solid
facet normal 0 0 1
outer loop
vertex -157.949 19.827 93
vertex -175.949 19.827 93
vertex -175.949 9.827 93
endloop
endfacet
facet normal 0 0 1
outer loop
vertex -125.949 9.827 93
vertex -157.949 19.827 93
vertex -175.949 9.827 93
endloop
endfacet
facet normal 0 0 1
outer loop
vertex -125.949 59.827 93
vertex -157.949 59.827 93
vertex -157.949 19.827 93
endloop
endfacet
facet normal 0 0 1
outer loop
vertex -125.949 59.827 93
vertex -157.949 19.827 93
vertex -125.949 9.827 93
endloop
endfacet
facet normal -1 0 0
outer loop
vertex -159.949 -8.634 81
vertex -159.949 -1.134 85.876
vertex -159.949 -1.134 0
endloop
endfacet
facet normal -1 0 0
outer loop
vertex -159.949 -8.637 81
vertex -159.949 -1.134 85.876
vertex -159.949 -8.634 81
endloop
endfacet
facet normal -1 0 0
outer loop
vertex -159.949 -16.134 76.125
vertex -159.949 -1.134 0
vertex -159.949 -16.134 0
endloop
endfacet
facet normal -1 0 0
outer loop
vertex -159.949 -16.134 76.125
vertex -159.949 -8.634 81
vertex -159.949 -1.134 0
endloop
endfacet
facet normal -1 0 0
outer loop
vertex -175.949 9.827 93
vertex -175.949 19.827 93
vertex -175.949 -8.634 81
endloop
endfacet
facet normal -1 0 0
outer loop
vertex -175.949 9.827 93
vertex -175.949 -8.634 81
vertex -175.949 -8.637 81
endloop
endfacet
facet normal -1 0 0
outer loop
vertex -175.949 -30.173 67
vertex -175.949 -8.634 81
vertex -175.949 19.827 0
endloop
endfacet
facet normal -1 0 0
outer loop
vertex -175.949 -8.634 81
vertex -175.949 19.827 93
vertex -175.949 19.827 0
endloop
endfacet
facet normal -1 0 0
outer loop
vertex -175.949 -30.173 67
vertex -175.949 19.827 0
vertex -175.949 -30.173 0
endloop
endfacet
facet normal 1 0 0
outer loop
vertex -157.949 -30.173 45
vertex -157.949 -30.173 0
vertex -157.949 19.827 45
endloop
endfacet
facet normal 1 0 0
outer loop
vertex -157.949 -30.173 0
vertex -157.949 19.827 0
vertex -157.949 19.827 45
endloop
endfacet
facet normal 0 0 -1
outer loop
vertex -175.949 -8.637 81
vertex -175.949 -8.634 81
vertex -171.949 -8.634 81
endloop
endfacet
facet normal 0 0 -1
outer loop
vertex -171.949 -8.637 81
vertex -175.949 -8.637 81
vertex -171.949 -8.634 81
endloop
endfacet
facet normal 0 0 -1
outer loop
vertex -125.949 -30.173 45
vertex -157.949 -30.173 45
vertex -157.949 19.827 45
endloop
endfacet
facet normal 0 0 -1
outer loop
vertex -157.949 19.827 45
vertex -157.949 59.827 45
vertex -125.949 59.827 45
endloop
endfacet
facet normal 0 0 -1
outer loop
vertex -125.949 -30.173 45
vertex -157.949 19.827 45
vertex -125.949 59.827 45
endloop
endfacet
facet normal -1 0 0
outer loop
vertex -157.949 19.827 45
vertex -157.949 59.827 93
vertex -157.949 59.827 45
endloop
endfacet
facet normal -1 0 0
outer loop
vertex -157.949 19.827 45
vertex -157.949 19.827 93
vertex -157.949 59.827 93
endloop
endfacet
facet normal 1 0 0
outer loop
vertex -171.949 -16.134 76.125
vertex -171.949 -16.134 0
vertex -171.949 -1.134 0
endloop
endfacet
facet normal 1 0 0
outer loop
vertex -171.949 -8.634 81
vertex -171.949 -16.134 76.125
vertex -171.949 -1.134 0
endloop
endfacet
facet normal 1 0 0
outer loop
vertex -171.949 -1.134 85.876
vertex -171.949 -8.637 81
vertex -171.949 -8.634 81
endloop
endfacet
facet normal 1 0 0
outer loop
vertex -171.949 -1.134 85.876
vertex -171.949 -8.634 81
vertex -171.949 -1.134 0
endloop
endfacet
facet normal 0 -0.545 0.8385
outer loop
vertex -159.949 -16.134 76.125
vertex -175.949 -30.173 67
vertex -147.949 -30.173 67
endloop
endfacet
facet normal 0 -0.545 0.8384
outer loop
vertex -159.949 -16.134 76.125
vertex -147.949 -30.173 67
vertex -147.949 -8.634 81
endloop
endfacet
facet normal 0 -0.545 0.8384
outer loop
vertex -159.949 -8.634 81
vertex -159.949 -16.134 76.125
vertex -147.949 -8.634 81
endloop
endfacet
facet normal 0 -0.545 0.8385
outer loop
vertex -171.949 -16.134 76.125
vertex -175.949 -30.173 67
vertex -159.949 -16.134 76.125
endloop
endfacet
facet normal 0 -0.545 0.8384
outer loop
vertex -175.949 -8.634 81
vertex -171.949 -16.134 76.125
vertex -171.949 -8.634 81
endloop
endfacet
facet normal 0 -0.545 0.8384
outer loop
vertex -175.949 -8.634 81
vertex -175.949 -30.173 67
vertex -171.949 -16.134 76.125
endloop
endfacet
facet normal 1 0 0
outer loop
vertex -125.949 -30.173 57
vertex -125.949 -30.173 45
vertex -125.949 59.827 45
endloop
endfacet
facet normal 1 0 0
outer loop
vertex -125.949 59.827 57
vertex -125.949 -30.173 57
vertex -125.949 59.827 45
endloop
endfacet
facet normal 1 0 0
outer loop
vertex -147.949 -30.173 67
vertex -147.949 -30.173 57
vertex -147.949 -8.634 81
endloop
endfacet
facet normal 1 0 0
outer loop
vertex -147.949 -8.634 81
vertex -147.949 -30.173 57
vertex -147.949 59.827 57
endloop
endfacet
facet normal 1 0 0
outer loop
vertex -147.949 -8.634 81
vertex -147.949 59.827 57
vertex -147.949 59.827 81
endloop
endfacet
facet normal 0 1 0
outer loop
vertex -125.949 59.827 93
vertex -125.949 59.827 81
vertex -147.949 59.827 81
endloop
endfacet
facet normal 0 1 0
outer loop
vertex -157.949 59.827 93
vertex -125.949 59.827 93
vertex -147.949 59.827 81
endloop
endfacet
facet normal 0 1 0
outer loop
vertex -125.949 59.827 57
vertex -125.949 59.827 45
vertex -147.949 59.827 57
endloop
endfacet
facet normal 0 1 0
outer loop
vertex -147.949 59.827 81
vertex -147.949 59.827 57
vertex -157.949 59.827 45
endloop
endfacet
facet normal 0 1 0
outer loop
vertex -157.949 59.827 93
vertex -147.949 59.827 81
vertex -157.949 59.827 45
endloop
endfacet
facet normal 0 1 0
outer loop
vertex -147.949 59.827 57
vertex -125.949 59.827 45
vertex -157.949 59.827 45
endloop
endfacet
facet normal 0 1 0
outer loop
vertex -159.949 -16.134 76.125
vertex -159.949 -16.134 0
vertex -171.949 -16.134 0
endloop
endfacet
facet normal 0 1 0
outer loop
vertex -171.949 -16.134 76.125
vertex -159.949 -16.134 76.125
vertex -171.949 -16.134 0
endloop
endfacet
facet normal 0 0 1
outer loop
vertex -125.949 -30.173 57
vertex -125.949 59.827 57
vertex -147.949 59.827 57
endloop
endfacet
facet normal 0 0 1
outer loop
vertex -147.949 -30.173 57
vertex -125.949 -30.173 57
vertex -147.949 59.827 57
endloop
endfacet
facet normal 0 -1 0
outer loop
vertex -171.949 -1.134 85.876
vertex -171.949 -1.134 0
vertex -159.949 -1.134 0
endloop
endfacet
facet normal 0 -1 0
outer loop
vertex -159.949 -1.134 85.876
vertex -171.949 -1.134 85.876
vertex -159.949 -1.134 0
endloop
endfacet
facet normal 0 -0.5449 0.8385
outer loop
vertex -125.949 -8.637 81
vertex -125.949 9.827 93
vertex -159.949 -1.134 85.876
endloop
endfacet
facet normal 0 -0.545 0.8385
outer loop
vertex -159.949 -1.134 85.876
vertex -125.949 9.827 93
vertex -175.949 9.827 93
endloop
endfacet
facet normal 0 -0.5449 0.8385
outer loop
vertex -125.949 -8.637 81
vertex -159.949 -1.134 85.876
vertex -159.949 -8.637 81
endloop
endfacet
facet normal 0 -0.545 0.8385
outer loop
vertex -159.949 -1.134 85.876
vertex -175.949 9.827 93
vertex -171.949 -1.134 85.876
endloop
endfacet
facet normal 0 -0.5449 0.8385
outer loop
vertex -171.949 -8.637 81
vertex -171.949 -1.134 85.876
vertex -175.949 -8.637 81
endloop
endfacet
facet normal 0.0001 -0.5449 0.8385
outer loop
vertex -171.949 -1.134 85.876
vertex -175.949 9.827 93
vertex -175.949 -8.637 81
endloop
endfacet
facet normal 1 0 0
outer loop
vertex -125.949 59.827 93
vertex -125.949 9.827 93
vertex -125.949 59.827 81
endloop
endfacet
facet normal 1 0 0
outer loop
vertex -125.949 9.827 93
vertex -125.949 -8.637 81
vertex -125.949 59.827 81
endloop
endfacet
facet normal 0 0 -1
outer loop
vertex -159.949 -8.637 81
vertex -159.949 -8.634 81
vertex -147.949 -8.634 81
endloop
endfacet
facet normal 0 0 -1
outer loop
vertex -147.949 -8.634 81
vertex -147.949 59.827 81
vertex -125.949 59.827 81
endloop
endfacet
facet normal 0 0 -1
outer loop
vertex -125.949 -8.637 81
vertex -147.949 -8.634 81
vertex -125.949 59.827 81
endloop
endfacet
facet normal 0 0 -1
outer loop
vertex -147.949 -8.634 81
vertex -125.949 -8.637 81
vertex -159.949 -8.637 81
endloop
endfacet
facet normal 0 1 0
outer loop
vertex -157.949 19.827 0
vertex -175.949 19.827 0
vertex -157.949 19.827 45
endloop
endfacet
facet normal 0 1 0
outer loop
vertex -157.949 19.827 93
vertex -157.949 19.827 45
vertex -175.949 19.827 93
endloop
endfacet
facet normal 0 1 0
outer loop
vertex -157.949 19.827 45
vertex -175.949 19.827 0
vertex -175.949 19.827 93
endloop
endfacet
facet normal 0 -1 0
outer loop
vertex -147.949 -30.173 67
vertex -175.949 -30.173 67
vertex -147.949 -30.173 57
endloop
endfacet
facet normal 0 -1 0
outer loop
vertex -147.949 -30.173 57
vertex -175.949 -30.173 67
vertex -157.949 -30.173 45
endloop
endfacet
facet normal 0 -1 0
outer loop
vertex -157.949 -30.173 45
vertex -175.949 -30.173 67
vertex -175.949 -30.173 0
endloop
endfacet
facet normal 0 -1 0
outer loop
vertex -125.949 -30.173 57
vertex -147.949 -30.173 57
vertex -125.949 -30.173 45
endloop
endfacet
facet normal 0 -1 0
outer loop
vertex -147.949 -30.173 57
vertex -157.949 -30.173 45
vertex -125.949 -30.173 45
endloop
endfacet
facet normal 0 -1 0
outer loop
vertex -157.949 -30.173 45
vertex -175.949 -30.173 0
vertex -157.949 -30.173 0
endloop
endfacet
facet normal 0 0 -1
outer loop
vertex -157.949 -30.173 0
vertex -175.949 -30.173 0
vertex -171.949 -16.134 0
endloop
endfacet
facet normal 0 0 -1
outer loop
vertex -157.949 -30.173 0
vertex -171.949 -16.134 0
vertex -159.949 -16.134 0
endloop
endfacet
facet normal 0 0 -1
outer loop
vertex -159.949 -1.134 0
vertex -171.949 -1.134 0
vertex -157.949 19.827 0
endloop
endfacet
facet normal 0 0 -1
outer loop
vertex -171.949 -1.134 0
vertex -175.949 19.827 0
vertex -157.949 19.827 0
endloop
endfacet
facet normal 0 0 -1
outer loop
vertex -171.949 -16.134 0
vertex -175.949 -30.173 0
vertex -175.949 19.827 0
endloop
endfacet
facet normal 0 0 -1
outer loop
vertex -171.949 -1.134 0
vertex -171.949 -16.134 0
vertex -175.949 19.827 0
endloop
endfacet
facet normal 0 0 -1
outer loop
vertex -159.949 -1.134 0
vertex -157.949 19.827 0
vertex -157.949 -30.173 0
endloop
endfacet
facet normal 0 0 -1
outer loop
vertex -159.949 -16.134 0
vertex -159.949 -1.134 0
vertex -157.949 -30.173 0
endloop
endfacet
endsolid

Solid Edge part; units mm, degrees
sketch "Sketch1" plane through (0, 0, 0) normal (0, 0, 1) x (1, 0, 0)
  line L0 (-175.9492, -30.1726) -> (-125.9492, -30.1726)
  line L1 (-175.9492, 59.8274) -> (-175.9492, -30.1726)
  line L2 (-125.9492, 59.8274) -> (-175.9492, 59.8274)
  line L3 (-125.9492, -30.1726) -> (-125.9492, 59.8274)
extrude "Protrusion1" add sketch "Sketch1" along normal blind 93
sketch "Sketch2" plane through (-150.9492, -30.1726, 46.5) normal (0, -1, 0) x (1, 0, 0)
  line L0 (25, -46.5) -> (-7, -46.5)
  line L1 (-7, -46.5) -> (-7, -1.5)
  line L2 (-7, -1.5) -> (25, -1.5)
  line L3 (25, -1.5) -> (25, -46.5)
extrude "ExtrudedCutout_1" cut sketch "Sketch2" along normal mid plane 366
sketch "Sketch3" plane through (-157.9492, 14.8274, 22.5) normal (1, 0, 0) x (0, 1, 0)
  line L0 (45, -22.5) -> (5, -22.5)
  line L1 (5, -22.5) -> (5, 22.5)
  line L2 (5, 22.5) -> (45, 22.5)
  line L3 (45, 22.5) -> (45, -22.5)
extrude "ExtrudedCutout_2" cut sketch "Sketch3" along normal mid plane 188
sketch "Sketch4" plane through (-150.9492, -30.1726, 46.5) normal (0, -1, 0) x (1, 0, 0)
  line L0 (25, 10.5) -> (3, 10.5)
  line L1 (3, 10.5) -> (3, 34.5)
  line L2 (3, 34.5) -> (25, 34.5)
  line L3 (25, 34.5) -> (25, 10.5)
extrude "ExtrudedCutout_3" cut sketch "Sketch4" along normal mid plane 238
sketch "Sketch5" plane through (-147.9492, 14.8274, 69) normal (1, 0, 0) x (0, 1, 0)
  line L0 (-45, 12) -> (-23.4615, 12)
  line L1 (-45, -2) -> (-23.4615, 12)
  line L2 (-45, -2) -> (-45, 12)
extrude "ExtrudedCutout_4" cut sketch "Sketch5" along normal mid plane 92
sketch "Sketch6" plane through (-125.9492, 14.8274, 87) normal (1, 0, 0) x (0, 1, 0)
  line L0 (-5, 6) -> (-23.4643, -6)
  line L1 (-23.4643, -6) -> (-45, -6)
  line L2 (-45, -6) -> (-45, 6)
  line L3 (-45, 6) -> (-5, 6)
extrude "ExtrudedCutout_5" cut sketch "Sketch6" along normal mid plane 122
sketch "Sketch7" plane through (-175.9492, 14.8274, 46.5) normal (-1, 0, 0) x (0, -1, 0)
  line L0 (-5, -1.5) -> (-5, 46.5)
  line L1 (-5, 46.5) -> (-45, 46.5)
  line L2 (-45, 46.5) -> (-45, -1.5)
  line L3 (-45, -1.5) -> (-5, -1.5)
extrude "Cutout_6" cut sketch "Sketch7" against normal blind 18
sketch "Sketch8" plane through (-150.9492, 34.8274, 93) normal (0, 0, 1) x (1, 0, 0)
  line L0 (-9, -50.9615) -> (-21, -50.9615)
  line L1 (-21, -50.9615) -> (-21, -43.4615)
  line L2 (-21, -43.4615) -> (-21, -35.9615)
  line L3 (-21, -35.9615) -> (-9, -35.9615)
  line L4 (-9, -35.9615) -> (-9, -50.9615)
extrude "Cutout_7" cut sketch "Sketch8" against normal blind 115
